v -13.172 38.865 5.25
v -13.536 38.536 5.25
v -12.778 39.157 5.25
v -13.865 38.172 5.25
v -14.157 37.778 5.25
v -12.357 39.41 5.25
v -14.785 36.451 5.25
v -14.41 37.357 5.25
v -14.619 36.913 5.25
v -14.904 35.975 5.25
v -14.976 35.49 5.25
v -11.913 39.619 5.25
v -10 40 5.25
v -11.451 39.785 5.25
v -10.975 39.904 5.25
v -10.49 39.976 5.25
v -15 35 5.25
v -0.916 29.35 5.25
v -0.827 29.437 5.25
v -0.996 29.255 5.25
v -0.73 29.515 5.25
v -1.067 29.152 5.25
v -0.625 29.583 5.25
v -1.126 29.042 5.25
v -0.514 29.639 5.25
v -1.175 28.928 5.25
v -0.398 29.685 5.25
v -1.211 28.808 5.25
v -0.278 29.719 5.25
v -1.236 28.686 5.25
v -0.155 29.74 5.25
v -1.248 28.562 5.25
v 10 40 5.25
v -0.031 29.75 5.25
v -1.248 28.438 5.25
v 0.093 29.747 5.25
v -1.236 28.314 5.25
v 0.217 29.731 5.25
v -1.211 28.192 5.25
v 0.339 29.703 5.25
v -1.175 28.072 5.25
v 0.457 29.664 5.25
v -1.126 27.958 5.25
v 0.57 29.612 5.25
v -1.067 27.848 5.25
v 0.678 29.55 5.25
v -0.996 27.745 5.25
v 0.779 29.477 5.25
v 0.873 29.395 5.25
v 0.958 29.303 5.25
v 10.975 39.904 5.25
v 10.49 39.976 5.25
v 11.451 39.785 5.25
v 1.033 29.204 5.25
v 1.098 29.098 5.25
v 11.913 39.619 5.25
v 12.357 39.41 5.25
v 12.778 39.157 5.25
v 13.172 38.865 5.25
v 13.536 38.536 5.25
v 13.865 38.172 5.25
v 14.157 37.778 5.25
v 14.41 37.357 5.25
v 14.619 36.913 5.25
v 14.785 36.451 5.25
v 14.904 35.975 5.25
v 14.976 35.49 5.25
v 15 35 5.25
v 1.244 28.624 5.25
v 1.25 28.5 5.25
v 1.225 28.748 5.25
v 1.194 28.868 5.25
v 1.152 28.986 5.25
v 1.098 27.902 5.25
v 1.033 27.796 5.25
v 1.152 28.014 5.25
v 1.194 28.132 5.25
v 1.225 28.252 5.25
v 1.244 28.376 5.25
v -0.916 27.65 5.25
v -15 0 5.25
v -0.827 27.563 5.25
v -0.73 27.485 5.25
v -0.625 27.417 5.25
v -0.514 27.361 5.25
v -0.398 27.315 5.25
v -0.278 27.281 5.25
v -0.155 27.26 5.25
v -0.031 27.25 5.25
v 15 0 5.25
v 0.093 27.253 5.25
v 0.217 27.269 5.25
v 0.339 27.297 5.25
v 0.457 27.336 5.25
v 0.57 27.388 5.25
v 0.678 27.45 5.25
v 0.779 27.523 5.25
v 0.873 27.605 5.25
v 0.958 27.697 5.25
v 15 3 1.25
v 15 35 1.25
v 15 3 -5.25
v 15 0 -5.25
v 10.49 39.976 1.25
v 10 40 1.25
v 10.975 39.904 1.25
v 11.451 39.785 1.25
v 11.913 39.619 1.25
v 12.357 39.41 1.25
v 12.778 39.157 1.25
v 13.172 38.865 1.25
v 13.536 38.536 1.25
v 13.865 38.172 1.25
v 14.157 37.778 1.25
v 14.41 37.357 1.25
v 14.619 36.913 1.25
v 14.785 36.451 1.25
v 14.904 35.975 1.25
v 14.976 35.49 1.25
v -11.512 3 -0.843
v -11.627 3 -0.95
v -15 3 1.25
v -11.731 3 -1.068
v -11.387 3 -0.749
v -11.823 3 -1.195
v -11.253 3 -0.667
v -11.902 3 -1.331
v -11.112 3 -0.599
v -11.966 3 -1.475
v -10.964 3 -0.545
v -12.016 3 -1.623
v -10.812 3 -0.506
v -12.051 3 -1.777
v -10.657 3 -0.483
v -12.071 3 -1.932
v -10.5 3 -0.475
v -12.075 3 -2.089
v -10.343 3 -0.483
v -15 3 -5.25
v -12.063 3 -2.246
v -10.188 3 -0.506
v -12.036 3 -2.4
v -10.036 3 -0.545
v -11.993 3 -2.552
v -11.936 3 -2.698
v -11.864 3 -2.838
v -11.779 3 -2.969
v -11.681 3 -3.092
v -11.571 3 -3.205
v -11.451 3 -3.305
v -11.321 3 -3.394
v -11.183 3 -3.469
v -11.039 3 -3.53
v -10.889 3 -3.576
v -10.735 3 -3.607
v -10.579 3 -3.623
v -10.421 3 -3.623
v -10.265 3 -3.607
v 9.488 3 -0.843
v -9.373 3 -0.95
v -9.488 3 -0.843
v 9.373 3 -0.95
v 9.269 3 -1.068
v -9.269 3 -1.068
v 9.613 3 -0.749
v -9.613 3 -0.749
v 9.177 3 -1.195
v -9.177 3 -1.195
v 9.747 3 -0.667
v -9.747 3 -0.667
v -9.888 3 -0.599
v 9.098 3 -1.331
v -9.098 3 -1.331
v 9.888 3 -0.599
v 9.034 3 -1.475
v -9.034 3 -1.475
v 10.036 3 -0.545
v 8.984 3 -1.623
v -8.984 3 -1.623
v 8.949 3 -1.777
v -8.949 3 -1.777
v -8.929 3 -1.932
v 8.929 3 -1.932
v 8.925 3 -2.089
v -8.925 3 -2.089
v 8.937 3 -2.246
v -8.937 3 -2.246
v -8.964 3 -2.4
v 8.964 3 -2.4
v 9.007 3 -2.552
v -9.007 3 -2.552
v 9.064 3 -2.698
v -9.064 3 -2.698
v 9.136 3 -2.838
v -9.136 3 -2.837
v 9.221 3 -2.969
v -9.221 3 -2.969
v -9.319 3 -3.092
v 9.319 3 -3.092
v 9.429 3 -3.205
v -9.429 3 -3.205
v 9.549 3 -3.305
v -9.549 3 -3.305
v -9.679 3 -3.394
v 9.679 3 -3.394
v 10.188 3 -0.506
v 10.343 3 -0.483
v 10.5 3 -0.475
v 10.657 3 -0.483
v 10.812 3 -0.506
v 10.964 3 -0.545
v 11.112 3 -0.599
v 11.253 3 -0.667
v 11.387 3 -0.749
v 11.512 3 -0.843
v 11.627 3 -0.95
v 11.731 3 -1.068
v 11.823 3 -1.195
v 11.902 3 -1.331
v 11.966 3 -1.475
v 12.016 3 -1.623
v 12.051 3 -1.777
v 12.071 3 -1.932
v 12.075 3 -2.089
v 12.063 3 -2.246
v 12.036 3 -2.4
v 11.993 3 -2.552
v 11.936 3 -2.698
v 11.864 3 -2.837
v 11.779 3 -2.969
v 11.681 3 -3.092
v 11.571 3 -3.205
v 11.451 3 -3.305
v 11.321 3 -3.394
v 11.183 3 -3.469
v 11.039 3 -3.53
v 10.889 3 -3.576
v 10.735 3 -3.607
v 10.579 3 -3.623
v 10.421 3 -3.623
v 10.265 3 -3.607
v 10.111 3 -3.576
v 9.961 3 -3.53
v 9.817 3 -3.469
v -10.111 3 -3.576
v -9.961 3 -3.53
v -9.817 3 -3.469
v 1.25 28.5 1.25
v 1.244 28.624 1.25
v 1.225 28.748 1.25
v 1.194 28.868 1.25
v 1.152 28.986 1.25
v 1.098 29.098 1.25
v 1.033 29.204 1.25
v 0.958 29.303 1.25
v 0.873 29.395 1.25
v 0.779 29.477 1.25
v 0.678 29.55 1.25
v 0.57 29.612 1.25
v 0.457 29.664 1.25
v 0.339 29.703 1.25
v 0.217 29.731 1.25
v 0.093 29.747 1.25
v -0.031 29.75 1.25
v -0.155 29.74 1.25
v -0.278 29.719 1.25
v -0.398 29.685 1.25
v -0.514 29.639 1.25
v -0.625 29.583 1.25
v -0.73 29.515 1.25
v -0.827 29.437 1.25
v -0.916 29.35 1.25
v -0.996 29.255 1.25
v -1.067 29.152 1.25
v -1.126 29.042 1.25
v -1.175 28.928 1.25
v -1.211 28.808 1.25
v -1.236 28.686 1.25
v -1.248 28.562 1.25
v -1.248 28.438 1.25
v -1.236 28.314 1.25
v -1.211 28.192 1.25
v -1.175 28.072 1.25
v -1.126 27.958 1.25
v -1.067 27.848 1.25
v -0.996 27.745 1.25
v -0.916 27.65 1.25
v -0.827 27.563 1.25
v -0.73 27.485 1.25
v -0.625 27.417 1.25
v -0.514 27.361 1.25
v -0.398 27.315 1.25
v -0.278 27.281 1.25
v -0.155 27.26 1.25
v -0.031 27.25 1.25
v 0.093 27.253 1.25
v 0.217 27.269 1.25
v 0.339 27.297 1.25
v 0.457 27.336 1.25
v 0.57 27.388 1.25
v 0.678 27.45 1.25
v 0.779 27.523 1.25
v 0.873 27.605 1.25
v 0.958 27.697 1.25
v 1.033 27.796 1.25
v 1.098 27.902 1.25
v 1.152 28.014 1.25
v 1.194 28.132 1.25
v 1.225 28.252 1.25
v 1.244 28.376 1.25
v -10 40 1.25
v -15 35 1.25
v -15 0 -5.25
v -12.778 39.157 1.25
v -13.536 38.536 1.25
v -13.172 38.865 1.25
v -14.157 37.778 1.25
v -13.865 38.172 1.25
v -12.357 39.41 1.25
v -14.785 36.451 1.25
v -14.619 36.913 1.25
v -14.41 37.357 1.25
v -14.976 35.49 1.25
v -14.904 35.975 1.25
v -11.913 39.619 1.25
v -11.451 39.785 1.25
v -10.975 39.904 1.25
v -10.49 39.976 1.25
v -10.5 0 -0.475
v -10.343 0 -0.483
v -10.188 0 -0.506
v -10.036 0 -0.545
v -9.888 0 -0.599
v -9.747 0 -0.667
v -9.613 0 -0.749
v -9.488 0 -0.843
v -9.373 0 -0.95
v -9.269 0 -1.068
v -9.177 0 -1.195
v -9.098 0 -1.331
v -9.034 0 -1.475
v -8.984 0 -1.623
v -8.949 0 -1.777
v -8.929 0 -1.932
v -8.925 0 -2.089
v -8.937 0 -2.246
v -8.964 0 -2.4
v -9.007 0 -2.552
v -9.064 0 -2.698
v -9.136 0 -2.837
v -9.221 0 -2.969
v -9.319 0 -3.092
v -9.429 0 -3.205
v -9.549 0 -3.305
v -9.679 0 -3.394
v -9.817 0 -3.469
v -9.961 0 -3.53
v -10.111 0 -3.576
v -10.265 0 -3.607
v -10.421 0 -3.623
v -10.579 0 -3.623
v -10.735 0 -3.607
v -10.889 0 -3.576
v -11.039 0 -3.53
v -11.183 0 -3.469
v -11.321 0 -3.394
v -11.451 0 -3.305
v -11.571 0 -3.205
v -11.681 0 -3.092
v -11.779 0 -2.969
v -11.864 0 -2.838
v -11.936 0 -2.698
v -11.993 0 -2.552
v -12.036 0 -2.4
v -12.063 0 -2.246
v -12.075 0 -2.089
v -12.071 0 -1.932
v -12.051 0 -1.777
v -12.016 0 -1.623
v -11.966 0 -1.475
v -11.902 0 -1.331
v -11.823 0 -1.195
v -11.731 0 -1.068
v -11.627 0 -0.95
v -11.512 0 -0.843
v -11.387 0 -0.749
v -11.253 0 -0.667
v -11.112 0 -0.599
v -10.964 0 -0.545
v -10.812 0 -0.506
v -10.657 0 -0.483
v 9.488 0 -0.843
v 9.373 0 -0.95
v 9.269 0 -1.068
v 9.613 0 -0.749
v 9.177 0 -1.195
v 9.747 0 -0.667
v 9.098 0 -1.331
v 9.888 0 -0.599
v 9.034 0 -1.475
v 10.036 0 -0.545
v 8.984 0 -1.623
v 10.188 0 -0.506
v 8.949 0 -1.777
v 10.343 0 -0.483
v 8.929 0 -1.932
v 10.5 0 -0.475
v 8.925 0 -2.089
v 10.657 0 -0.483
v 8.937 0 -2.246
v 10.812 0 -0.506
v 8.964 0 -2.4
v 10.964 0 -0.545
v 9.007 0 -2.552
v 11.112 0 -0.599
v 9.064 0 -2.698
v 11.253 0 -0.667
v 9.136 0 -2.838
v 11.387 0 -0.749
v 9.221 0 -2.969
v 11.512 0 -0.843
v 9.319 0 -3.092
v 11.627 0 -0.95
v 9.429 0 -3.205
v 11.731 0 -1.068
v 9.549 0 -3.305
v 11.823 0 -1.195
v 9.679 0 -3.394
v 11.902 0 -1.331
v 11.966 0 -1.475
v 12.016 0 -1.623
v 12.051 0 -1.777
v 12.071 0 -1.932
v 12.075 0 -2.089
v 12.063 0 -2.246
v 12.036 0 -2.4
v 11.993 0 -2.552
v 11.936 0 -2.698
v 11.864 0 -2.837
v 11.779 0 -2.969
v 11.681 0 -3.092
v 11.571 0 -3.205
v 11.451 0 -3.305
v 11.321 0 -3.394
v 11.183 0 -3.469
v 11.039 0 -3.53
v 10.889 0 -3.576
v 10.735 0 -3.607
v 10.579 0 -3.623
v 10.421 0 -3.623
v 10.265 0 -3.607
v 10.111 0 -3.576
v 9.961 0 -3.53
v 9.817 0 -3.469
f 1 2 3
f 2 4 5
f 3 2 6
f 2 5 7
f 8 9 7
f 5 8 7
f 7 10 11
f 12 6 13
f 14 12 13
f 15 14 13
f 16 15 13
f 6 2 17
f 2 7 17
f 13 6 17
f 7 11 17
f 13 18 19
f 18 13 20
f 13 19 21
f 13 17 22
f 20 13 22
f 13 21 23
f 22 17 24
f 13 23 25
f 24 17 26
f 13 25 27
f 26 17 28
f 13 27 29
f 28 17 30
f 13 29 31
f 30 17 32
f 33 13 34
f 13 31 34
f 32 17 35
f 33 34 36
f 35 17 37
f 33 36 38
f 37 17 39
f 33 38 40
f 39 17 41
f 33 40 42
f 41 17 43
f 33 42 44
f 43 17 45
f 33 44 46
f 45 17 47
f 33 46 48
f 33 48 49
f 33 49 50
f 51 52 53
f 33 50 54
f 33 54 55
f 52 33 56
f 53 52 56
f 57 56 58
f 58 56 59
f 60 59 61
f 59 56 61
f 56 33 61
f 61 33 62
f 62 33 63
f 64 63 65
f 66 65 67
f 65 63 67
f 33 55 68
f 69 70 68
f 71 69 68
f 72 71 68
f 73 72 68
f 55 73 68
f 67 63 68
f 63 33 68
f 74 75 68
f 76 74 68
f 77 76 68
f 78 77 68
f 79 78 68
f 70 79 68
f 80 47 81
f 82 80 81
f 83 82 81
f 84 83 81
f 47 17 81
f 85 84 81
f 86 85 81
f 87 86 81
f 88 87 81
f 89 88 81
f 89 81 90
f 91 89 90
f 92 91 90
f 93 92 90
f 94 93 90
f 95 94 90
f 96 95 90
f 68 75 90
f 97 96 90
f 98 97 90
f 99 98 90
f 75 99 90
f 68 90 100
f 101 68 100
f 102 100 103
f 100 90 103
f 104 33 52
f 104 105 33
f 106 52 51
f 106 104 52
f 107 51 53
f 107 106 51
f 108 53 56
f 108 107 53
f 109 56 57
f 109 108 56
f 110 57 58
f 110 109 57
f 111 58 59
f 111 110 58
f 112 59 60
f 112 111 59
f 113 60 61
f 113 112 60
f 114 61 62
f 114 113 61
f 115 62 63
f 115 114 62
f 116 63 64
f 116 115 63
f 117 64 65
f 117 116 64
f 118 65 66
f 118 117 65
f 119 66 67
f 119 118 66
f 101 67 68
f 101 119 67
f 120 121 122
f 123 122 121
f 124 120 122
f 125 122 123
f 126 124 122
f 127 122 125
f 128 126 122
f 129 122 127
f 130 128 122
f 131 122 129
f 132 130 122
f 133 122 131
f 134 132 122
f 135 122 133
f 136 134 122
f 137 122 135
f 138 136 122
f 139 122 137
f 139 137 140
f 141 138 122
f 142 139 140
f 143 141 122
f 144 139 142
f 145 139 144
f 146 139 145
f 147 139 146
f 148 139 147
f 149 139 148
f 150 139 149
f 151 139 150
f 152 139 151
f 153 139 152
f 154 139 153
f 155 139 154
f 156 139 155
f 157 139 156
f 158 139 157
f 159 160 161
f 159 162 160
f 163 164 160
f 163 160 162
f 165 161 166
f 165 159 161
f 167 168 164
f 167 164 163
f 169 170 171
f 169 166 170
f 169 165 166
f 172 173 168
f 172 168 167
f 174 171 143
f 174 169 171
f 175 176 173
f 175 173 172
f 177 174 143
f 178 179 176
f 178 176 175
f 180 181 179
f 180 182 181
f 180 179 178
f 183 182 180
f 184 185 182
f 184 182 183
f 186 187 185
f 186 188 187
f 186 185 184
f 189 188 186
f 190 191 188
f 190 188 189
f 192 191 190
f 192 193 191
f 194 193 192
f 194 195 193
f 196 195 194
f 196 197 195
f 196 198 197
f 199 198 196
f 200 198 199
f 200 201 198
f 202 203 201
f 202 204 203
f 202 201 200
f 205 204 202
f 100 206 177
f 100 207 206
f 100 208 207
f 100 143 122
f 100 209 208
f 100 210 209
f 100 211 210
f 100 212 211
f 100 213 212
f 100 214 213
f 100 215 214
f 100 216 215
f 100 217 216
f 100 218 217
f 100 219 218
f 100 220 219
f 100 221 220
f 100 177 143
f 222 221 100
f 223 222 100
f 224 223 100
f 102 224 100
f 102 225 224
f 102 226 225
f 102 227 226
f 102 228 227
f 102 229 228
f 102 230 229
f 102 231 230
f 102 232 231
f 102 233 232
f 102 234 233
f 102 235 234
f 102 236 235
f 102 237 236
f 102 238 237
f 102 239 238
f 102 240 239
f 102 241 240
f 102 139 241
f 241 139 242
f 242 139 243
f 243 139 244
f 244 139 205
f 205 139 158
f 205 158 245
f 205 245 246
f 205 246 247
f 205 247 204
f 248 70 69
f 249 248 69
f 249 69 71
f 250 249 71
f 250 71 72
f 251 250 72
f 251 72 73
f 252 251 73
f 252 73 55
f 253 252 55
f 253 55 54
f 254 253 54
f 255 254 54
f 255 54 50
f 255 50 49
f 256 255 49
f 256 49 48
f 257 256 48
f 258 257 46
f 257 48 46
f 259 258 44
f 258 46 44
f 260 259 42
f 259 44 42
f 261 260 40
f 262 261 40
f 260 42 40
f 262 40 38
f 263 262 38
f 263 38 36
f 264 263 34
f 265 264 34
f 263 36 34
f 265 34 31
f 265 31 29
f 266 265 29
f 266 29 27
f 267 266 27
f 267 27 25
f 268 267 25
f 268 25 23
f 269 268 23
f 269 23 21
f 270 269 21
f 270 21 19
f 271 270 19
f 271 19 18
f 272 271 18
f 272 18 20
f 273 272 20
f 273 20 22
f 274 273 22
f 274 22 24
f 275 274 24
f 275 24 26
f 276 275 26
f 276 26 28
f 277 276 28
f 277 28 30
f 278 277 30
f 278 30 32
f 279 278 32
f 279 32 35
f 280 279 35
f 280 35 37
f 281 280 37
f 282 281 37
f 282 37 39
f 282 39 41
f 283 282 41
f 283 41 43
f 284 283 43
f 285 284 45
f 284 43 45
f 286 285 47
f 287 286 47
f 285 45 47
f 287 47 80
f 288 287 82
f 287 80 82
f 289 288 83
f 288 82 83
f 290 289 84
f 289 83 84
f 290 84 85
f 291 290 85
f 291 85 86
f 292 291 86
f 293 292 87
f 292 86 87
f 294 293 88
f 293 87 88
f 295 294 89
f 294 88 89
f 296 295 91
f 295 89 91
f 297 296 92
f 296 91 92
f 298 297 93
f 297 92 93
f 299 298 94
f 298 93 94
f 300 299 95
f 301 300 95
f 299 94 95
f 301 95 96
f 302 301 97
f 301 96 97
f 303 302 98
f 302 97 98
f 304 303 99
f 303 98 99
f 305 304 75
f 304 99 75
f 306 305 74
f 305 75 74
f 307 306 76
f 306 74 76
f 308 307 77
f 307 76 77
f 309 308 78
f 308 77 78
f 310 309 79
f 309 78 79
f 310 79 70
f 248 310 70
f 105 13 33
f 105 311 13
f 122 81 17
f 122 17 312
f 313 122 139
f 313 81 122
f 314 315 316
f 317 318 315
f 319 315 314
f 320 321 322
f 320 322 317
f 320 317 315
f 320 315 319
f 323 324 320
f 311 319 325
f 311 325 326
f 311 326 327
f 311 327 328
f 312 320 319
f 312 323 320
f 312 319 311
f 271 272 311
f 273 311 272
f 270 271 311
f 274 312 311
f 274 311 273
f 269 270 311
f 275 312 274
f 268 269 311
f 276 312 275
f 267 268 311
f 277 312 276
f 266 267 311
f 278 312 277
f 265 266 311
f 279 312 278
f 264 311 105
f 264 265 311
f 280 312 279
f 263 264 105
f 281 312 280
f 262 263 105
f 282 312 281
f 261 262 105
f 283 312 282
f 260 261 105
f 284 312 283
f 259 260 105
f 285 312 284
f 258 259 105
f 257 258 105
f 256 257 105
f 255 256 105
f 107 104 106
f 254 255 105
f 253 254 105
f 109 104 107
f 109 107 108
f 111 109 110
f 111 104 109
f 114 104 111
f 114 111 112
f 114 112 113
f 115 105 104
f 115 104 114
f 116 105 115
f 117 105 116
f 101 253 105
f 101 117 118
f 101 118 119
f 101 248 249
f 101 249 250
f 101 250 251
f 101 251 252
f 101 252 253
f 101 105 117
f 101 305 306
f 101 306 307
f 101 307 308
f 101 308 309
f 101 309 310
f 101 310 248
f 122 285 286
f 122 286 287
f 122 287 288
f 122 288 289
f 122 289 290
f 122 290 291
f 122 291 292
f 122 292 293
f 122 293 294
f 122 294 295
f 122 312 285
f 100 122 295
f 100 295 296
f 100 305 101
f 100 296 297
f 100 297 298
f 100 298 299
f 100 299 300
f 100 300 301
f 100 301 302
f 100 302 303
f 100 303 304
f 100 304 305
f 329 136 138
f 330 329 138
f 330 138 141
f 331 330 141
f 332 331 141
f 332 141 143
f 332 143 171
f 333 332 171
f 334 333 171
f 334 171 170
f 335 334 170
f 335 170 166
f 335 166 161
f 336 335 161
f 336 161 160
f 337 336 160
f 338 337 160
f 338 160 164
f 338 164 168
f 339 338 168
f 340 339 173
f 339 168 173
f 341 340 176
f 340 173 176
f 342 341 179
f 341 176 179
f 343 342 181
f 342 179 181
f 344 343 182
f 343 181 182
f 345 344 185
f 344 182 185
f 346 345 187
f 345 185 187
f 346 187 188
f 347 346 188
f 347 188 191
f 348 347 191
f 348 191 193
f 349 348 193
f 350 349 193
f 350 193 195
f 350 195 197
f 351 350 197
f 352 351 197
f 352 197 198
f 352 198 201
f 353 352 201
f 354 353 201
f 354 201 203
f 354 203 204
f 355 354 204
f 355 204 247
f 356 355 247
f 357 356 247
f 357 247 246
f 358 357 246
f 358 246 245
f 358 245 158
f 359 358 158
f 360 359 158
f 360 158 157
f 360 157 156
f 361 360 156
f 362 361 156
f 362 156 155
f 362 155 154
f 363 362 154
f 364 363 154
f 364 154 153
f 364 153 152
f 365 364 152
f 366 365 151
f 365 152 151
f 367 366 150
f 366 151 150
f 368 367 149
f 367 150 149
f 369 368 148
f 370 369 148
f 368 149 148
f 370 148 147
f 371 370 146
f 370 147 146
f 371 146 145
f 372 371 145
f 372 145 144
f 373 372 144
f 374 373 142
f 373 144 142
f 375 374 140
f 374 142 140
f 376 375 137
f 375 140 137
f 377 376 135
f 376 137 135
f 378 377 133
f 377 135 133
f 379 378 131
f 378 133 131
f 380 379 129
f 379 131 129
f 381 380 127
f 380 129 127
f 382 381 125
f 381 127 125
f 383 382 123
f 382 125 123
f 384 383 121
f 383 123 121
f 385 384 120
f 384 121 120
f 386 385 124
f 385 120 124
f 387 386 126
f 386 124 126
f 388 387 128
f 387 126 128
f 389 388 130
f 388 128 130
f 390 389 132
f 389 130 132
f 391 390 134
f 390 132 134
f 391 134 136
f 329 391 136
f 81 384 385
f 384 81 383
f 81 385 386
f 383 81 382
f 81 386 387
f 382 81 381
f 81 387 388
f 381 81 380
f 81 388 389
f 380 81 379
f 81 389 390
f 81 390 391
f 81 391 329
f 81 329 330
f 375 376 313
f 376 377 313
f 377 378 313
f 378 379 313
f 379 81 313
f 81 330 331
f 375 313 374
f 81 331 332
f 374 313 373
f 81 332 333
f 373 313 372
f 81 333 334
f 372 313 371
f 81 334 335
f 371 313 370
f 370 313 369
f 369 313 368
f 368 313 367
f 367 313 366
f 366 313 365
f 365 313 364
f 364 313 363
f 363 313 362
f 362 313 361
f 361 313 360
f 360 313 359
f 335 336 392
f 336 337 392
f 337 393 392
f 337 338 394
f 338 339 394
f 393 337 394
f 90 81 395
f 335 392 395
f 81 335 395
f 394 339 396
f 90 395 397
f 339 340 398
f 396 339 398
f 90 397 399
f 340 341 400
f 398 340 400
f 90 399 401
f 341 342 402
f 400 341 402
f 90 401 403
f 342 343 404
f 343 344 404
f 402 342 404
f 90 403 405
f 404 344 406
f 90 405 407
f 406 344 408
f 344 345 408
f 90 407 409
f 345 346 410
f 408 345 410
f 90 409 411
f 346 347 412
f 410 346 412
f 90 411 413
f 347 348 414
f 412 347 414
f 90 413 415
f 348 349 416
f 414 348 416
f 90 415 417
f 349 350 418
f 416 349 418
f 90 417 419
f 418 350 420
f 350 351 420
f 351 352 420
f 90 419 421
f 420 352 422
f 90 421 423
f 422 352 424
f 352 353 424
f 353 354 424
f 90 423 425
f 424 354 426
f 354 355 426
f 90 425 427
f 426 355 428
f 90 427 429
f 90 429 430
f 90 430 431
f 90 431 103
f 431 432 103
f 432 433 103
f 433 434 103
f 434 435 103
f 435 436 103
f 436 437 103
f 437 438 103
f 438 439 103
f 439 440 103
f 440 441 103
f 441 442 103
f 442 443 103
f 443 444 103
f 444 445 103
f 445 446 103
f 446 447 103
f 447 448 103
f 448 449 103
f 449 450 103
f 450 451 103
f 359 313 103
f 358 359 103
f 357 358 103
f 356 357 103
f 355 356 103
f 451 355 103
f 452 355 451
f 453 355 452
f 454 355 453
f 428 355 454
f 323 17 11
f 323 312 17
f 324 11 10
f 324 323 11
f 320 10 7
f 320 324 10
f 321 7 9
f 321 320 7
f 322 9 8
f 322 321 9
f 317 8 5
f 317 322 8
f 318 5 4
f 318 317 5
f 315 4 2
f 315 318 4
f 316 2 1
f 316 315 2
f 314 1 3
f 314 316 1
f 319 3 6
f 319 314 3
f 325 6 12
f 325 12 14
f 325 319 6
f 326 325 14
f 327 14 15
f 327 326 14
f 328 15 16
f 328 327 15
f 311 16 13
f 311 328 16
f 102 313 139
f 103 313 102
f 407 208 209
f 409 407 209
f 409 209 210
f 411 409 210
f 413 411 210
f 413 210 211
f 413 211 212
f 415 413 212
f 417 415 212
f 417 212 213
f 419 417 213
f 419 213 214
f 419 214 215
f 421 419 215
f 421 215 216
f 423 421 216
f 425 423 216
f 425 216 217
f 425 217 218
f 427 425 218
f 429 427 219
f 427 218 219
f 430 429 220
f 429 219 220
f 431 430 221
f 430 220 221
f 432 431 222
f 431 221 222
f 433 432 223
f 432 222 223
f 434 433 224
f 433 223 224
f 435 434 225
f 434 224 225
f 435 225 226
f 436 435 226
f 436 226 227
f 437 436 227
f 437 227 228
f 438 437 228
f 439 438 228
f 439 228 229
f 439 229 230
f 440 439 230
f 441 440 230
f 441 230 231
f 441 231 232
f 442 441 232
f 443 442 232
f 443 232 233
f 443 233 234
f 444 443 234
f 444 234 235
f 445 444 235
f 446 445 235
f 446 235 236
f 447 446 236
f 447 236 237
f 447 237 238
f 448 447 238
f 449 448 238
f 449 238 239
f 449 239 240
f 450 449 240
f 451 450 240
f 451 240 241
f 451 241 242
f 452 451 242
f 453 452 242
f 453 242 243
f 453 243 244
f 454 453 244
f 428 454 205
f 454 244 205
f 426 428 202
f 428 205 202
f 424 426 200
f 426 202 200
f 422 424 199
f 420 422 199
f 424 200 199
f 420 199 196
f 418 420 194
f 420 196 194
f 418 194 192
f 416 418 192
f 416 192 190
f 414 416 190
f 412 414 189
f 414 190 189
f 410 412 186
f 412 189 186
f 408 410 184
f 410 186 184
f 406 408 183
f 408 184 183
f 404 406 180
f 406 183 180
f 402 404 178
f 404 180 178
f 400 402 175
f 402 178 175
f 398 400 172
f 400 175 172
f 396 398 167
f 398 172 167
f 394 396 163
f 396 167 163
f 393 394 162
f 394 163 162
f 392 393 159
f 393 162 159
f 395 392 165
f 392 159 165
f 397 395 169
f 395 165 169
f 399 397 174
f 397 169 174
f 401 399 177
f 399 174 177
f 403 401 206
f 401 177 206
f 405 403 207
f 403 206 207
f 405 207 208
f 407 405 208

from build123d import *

# Parameters (mm, degrees)
SKETCH1_W           = 30
SKETCH1_H           = 10.5
BOSS_EXTRUDE1_DEPTH = 3
SKETCH2_W           = 30
SKETCH2_H           = 4
BOSS_EXTRUDE2_DEPTH = 37
SKETCH3_R           = 1.575
CUT_EXTRUDE1_DEPTH  = 41.268629229
SKETCH4_R           = 1.575
CUT_EXTRUDE2_DEPTH  = 41.268629229
FILLET1_R           = 5
SKETCH5_R           = 1.25
CUT_EXTRUDE3_DEPTH  = 44.991476447


with BuildPart() as part:
    # Sketch1 → Boss-Extrude1 (new body)
    with BuildSketch(Plane(origin=(0, 0, 0), x_dir=(1, 0, 0), z_dir=(0, 1, 0))):
        Rectangle(SKETCH1_W, SKETCH1_H)
    extrude(amount=BOSS_EXTRUDE1_DEPTH)

    # Sketch2 → Boss-Extrude2 (add)
    with BuildSketch(Plane(origin=(0, 3, 0), x_dir=(1, 0, 0), z_dir=(0, 1, 0))):
        with Locations((0, -3.25)):
            Rectangle(SKETCH2_W, SKETCH2_H)
    extrude(amount=BOSS_EXTRUDE2_DEPTH)

    # Sketch3 → Cut-Extrude1 (cut, through all)
    with BuildSketch(Plane(origin=(0, 3, 0), x_dir=(1, 0, 0), z_dir=(0, 1, 0))):
        with Locations(Location((-10.5, 2.05, 0), (0, 0, 270))):
            Circle(SKETCH3_R)
    extrude(amount=-CUT_EXTRUDE1_DEPTH, mode=Mode.SUBTRACT)

    # Sketch4 → Cut-Extrude2 (cut, through all)
    with BuildSketch(Plane(origin=(0, 3, 0), x_dir=(1, 0, 0), z_dir=(0, 1, 0))):
        with Locations(Location((10.5, 2.05, 0), (0, 0, 270))):
            Circle(SKETCH4_R)
    extrude(amount=-CUT_EXTRUDE2_DEPTH, mode=Mode.SUBTRACT)

    # Fillet1
    fillet1_edges = [part.edges().sort_by_distance(p)[0] for p in [
        (-15, 40, 3.25),
        (15, 40, 3.25),
    ]]
    fillet(fillet1_edges, radius=FILLET1_R)

    # Sketch5 → Cut-Extrude3 (cut, through all)
    with BuildSketch(Plane.XY.offset(5.25)):
        with Locations((0, 28.5)):
            Circle(SKETCH5_R)
    extrude(amount=-CUT_EXTRUDE3_DEPTH, mode=Mode.SUBTRACT)


solid = part.part
